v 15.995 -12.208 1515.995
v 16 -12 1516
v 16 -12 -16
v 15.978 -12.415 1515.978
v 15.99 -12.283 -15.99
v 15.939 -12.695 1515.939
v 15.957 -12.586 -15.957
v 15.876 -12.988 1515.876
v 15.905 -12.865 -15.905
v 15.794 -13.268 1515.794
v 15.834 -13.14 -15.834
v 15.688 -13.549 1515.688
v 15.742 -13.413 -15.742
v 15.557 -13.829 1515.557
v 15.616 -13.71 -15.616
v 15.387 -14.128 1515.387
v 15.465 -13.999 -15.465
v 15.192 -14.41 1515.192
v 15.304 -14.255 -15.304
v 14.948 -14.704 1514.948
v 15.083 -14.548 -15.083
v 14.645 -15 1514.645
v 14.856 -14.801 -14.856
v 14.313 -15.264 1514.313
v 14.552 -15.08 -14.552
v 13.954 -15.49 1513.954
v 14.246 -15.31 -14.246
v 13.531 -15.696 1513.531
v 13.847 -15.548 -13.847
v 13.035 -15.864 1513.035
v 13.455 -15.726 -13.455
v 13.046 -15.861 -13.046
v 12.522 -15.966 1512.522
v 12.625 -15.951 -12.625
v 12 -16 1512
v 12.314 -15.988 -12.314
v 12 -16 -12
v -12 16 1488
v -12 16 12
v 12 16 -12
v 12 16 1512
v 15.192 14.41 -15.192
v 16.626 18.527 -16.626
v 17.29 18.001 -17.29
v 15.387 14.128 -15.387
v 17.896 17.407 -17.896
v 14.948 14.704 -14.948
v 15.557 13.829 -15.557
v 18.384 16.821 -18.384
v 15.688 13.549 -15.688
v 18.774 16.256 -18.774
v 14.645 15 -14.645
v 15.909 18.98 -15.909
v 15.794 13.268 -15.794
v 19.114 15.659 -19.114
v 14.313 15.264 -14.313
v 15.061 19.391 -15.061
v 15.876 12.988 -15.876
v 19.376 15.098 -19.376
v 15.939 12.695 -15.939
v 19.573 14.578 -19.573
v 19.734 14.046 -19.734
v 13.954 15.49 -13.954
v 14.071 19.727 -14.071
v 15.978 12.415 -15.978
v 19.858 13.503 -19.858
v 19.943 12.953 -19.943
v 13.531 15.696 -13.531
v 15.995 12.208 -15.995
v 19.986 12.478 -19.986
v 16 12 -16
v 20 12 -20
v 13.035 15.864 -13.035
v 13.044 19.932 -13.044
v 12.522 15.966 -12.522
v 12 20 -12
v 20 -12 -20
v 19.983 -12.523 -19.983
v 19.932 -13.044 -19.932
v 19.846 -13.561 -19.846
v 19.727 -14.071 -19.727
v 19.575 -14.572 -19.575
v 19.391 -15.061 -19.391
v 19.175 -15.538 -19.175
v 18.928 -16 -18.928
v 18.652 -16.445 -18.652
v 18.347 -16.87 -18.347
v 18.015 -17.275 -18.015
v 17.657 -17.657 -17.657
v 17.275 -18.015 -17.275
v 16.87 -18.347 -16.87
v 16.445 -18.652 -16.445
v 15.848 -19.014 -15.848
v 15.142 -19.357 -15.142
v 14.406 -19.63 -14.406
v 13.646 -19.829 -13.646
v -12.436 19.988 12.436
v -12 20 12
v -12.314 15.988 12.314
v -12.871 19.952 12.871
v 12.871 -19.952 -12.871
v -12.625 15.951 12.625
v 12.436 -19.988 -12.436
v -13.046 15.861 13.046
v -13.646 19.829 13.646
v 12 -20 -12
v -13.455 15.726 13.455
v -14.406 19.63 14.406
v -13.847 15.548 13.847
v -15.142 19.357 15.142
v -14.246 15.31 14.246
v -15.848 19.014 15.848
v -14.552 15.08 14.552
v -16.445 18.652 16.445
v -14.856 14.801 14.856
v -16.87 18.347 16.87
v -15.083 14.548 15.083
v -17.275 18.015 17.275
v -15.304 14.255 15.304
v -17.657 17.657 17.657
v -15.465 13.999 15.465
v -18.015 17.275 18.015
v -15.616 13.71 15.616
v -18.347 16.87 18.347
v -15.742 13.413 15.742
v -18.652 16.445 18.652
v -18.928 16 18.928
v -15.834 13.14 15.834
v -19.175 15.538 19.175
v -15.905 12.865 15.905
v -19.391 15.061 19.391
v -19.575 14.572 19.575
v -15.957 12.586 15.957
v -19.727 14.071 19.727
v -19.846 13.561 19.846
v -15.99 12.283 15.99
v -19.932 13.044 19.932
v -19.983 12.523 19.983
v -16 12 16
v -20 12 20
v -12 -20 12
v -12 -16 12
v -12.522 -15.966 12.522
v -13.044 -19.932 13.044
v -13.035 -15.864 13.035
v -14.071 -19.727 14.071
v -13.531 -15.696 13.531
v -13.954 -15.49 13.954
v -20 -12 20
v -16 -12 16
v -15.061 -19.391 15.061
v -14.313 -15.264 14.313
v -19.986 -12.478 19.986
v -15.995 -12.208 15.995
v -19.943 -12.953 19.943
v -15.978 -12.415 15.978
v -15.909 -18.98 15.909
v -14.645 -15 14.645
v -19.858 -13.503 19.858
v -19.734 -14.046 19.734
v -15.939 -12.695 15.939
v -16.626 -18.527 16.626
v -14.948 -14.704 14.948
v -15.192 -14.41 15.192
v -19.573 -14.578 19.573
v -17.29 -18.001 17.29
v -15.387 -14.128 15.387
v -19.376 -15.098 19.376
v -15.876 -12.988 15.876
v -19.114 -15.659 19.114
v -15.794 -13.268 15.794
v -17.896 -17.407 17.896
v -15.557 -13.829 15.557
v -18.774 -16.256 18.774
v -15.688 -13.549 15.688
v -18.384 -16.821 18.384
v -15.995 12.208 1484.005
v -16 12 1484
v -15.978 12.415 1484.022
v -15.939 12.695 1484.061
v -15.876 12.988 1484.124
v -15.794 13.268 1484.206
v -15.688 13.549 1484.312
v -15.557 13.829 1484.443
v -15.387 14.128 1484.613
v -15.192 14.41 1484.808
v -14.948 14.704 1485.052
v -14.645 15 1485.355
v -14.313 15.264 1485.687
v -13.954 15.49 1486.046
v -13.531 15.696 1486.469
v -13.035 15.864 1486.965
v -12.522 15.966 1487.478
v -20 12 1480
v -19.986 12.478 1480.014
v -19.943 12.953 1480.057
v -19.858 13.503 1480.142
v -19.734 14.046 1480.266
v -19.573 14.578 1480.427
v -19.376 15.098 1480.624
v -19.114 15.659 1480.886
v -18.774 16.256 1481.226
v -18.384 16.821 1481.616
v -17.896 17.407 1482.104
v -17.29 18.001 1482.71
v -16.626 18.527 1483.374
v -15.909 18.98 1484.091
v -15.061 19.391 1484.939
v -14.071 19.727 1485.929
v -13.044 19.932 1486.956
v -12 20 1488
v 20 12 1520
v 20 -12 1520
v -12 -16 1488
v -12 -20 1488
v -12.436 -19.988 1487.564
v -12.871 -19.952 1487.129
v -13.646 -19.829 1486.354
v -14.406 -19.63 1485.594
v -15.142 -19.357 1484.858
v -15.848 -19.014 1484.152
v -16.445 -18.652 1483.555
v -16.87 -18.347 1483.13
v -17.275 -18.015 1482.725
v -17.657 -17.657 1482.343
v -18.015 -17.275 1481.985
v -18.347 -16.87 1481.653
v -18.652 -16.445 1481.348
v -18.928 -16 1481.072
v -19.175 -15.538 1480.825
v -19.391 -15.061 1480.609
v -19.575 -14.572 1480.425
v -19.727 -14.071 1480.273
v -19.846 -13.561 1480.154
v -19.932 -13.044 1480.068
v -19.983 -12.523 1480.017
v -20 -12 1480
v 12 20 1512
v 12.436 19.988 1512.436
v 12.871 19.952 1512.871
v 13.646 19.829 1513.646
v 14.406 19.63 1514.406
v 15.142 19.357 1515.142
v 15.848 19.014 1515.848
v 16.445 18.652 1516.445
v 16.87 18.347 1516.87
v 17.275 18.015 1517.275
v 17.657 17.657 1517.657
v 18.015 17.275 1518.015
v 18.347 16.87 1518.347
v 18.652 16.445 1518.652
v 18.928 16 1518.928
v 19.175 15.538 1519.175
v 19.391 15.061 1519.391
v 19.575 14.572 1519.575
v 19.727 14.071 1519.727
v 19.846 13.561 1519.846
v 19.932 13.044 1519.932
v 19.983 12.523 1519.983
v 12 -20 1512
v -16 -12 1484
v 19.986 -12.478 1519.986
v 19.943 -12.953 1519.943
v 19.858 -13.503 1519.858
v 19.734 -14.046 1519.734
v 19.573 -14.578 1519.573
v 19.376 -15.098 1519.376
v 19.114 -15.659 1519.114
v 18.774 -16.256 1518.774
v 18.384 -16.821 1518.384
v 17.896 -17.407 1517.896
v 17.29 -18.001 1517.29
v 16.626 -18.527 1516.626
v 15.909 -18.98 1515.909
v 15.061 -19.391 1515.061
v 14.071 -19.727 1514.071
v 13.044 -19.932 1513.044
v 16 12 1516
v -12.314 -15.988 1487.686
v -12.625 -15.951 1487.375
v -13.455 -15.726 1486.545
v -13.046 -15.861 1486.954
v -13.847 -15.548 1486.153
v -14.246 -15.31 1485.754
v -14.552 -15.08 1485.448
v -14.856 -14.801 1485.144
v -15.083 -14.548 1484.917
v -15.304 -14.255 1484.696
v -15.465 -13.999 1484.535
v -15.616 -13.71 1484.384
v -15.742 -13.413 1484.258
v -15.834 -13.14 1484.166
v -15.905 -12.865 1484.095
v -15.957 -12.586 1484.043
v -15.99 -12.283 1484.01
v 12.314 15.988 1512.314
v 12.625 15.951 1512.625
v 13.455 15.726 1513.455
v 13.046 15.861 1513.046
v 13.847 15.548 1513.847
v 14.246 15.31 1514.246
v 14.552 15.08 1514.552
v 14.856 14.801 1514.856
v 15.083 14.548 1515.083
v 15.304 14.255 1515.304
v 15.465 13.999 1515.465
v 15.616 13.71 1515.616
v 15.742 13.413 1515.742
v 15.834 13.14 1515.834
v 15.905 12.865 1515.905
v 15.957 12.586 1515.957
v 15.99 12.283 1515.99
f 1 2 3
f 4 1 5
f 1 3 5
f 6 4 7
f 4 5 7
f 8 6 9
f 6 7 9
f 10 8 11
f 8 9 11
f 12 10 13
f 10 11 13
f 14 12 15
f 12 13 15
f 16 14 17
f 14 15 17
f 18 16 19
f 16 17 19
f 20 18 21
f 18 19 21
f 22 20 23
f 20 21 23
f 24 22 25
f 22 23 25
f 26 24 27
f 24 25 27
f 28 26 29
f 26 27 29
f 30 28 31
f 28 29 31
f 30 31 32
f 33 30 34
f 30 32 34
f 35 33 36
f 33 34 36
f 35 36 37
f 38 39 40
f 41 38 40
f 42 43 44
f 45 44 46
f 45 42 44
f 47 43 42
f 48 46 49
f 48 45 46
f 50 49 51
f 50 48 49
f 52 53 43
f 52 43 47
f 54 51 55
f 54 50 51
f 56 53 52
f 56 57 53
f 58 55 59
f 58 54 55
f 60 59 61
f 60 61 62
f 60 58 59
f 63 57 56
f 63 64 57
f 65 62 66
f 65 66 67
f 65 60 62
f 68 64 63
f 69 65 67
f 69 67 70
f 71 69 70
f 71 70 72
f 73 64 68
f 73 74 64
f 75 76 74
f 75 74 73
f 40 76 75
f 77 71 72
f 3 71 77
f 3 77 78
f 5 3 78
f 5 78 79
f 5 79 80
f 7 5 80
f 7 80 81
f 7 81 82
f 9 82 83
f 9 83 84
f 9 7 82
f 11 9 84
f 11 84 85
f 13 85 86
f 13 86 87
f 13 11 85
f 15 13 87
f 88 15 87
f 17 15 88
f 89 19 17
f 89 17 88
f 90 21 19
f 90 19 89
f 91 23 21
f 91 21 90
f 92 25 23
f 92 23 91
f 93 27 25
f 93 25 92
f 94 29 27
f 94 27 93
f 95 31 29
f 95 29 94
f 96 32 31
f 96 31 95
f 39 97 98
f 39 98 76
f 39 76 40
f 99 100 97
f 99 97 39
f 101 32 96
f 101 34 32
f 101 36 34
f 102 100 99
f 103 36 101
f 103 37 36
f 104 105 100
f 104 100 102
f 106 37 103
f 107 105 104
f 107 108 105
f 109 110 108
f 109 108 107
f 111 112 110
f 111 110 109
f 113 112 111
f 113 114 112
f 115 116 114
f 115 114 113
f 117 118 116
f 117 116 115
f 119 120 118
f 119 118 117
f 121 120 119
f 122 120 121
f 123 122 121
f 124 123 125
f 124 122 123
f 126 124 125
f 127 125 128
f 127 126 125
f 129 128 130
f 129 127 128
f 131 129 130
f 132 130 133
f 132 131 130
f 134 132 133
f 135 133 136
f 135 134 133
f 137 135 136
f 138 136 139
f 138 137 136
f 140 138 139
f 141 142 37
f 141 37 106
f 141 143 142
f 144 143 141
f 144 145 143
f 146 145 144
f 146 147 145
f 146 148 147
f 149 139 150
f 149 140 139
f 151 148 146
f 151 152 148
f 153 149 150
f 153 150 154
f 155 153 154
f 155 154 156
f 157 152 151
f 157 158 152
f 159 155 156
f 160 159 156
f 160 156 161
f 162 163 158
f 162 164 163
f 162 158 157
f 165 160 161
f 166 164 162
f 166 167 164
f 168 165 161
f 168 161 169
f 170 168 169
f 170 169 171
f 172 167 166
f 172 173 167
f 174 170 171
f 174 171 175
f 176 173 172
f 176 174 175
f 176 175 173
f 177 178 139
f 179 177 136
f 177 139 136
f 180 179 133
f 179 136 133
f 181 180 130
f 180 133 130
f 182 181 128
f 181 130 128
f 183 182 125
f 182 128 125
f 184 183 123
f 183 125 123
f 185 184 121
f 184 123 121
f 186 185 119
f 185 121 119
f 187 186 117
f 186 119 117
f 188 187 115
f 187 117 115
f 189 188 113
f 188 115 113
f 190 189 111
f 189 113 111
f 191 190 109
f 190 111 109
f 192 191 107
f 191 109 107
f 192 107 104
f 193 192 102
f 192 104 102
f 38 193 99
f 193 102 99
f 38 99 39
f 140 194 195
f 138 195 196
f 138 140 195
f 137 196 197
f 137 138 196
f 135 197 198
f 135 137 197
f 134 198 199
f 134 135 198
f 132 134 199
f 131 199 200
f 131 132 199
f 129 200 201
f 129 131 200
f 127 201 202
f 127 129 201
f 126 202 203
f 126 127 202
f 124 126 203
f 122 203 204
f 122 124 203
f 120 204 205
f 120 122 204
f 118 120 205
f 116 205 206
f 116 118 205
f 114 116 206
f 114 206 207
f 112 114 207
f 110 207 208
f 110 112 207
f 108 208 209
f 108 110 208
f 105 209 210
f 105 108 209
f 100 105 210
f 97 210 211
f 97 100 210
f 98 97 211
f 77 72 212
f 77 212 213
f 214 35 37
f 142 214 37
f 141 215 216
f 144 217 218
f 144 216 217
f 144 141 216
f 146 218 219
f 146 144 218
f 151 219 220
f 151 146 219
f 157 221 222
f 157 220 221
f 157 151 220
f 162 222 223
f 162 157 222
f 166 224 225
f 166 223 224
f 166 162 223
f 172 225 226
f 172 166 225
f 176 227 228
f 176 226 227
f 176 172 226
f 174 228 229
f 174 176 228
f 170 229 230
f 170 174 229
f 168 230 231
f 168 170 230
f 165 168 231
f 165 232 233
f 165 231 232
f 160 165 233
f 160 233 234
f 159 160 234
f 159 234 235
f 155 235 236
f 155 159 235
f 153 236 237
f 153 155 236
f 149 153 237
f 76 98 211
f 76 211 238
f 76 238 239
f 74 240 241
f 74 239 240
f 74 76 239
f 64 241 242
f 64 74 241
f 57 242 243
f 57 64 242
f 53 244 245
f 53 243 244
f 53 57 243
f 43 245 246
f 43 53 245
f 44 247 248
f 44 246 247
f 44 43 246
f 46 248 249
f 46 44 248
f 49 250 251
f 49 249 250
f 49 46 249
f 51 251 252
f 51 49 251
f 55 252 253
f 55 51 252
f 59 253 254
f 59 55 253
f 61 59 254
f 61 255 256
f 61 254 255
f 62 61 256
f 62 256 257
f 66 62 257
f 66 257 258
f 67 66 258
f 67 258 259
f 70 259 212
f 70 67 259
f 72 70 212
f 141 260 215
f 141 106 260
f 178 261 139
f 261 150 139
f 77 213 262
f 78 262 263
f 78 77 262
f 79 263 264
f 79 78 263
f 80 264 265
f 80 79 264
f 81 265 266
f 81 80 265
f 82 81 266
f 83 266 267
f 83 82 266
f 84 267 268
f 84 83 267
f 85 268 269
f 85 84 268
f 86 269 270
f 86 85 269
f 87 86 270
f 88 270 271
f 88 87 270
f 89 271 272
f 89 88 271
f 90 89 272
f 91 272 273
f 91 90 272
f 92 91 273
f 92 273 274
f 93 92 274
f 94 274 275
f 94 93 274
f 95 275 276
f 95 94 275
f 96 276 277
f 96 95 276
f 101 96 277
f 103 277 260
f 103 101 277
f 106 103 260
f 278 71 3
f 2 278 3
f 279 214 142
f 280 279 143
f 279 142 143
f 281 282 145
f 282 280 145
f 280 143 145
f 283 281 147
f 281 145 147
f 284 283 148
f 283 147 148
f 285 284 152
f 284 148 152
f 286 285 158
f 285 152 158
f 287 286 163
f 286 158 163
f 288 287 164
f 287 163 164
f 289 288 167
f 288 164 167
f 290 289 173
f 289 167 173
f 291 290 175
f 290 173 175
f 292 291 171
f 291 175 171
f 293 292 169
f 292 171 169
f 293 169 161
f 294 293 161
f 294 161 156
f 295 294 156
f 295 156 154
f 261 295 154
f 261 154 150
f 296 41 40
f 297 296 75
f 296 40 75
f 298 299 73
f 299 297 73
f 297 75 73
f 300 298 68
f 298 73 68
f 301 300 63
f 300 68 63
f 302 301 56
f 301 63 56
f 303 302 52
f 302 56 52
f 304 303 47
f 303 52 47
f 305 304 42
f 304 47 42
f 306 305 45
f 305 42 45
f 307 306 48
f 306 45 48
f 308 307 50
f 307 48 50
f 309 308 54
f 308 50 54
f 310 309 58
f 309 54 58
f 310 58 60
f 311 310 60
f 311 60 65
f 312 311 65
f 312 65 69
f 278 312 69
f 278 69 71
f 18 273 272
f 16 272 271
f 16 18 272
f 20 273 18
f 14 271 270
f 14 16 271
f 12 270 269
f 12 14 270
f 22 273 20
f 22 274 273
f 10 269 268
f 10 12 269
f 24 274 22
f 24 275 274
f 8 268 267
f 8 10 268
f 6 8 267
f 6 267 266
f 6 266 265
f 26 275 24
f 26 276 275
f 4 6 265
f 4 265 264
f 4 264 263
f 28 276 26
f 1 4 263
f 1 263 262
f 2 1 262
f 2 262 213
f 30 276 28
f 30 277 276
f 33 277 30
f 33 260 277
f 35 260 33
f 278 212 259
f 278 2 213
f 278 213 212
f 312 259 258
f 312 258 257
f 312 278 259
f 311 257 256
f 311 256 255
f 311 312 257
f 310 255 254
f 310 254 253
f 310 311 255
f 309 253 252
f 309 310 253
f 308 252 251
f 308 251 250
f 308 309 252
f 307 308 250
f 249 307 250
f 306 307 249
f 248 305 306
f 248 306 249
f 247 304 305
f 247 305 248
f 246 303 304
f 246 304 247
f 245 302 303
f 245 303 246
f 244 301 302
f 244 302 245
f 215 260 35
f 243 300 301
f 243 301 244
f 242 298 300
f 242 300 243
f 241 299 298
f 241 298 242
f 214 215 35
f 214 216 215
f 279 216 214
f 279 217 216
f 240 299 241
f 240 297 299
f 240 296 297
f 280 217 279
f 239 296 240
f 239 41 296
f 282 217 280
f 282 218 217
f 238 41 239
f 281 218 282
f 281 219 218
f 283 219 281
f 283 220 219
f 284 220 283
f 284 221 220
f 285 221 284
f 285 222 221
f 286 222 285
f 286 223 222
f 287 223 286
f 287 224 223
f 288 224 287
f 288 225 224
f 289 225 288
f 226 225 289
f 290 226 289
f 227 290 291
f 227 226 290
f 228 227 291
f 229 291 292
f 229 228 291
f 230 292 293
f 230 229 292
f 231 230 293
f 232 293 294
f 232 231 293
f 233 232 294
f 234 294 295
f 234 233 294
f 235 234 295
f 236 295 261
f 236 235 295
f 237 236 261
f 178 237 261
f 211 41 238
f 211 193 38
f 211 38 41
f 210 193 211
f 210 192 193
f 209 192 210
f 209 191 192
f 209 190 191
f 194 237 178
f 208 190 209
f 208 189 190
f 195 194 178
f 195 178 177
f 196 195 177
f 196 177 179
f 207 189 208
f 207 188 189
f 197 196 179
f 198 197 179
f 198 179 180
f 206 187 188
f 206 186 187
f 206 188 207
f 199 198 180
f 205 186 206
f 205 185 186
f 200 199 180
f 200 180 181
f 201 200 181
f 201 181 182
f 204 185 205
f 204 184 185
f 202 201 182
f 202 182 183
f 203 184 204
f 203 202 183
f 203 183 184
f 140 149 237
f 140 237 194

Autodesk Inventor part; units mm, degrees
ref_plane "Start plane" through (0, 0, -20) normal (0, 0, 1) x (1, 0, 0)
ref_plane "End plane" through (0, 0, 1520) normal (0, 0, 1) x (1, 0, 0)
sketch "Sketch" plane through (0, 0, 0) normal (0, 0, 1) x (1, 0, 0)
  line L0 (-20, -12) -> (-20, 12)
  line L1 (-12, 20) -> (12, 20)
  line L2 (20, 12) -> (20, -12)
  line L3 (12, -20) -> (-12, -20)
  arc A0 (-20, -12) -> (-12, -20) centre (-12, -12) ccw
  arc A1 (-12, 20) -> (-20, 12) centre (-12, 12) ccw
  arc A2 (20, 12) -> (12, 20) centre (12, 12) ccw
  arc A3 (12, -20) -> (20, -12) centre (12, -12) ccw
  arc A4 (-12, 16) -> (-16, 12) centre (-12, 12) ccw
  line L4 (-12, 16) -> (12, 16)
  arc A5 (16, 12) -> (12, 16) centre (12, 12) ccw
  line L5 (16, 12) -> (16, -12)
  arc A6 (12, -16) -> (16, -12) centre (12, -12) ccw
  line L6 (12, -16) -> (-12, -16)
  arc A7 (-16, -12) -> (-12, -16) centre (-12, -12) ccw
  line L7 (-16, -12) -> (-16, 12)
  line L8 (0, 30.3196) -> (0, -30.3196) construction
  line L9 (-30.3196, 0) -> (30.3196, 0) construction
  dimension "d7" = 8
  dimension "d10" = 40
  dimension "d11" = 40
  dimension "d12" = 4
  dimension "d15" = 20
  dimension "d16" = 20
extrude "Body" add sketch "Sketch" along normal up to surface (1540 mm away) from surface at -20
sketch "Sketch3" plane through (0, 0, 0) normal (0, 0, 1) x (1, 0, 0)
  line L0 (0, 0) -> (10, 0)
ref_plane "Work Plane3" through (0, 0, 0) normal (0, -1, 0) x (1, 0, 0)
sketch "Sketch4" plane through (0, 0, 0) normal (0, -1, 0) x (1, 0, 0)
  line L0 (-2, -20) -> (12, -20)
  line L1 (-2, 1520) -> (12, 1520)
  dimension "d18" = 1540
ref_plane "Work Plane4" through (20, 0, -20) normal (-0.7071, 0, -0.7071) x (-0.7071, 0, 0.7071)
split "Split1" plane through (20, 0, -20) removes the side toward (-0.7071, 0, -0.7071)
ref_plane "Work Plane5" through (20, 0, 1520) normal (-0.7071, 0, 0.7071) x (0.7071, 0, 0.7071)
split "Split2" plane through (20, 0, 1520) removes the side toward (-0.7071, 0, 0.7071)
equation "\"d7\" = G_IR"
equation "\"d10\" = G_H"
equation "\"d11\" = G_W"
equation "\"d12\" = G_T"
equation "\"d15\" = 0.5 * d10"
equation "\"d16\" = 0.5 * d11"
equation "\"d3\" = G_L"
equation "\"G_W\" = 40"
equation "\"G_H\" = 40"
equation "\"G_T\" = 4"
equation "\"G_IR\" = 8"
equation "\"G_L\" = d18"
equation "\"G_OFFSET_START\" = 20"
equation "\"G_OFFSET_END\" = 20"
equation "\"d13\" = -G_OFFSET_START"
equation "\"d14\" = G_OFFSET_END + B_L"
equation "\"B_L\" = 1500"
properties part number "DIN EN 10219-2 - 40 x 40 x 4  - 1540" material "Steel, Mild"
